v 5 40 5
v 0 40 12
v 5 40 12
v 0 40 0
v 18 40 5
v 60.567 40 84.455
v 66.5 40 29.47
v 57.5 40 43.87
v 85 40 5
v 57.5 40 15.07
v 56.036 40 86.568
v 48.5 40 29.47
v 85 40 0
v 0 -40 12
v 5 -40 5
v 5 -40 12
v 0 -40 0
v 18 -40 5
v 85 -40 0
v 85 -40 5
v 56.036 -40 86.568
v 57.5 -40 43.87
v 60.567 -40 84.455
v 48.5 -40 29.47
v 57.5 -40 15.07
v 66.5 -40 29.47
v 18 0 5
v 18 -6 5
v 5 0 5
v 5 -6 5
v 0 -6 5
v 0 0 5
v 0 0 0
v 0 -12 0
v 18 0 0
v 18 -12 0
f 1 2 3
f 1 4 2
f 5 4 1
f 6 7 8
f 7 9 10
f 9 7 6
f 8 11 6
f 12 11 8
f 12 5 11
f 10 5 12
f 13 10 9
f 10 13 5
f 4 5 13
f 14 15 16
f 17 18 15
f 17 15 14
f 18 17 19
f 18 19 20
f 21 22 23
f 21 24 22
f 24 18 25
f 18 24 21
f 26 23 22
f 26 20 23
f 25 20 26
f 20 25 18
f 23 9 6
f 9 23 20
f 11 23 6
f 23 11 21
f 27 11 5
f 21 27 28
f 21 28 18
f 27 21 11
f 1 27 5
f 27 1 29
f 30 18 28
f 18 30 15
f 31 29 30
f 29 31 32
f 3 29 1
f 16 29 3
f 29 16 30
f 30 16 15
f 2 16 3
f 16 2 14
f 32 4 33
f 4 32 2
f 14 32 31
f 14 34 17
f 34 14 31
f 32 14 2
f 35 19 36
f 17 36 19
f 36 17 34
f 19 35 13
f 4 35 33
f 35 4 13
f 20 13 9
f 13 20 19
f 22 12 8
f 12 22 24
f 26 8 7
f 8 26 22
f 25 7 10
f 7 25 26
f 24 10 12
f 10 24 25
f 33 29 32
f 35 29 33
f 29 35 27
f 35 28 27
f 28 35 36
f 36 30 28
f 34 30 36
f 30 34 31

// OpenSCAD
// Phone & Tablet Stand with cable channel - original parametric design (Brian Sacco)
// Solid wedge profile (no bridges, no flat overhangs) with a pointed weight-saving window:
// prints standing as oriented, without supports (verified with PrusaSlicer).
angle     = 65;    // viewing angle from horizontal (degrees)
width     = 80;    // stand width (mm)
device_t  = 13;    // slot width: phone + case thickness (mm)
lip_h     = 12;    // front lip height
back_h    = 90;    // backrest length
t         = 5;     // plate thickness
cable     = true;  // channel for the charging cable
depth     = 85;    // base depth
$fn = 48;

bx = t + device_t;                        // where the backrest starts (front face)
tx = bx + back_h * cos(angle);            // backrest top, front face
tz = t + back_h * sin(angle);
nx = t * sin(angle); nz = -t * cos(angle);   // backrest thickness, perpendicular to its face

module profile() {
    polygon([
        [0, 0], [depth, 0], [depth, t],       // base
        [tx + nx, tz + nz],                   // rear slope up to the back of the backrest top
        [tx, tz],                             // backrest top
        [bx, t],                              // backrest front face down to the slot
        [t, t], [t, lip_h], [0, lip_h]        // slot floor + front lip
    ]);
}
// pointed (diamond) window: all edges steeper than 55 degrees -> self-supporting
module window() {
    cx = (bx + depth) / 2 + 6; cz = t + (tz - t) * 0.30;
    hw = min(9, (depth - bx) * 0.18); hh = hw * 1.6;
    polygon([[cx, cz - hh], [cx + hw, cz], [cx, cz + hh], [cx - hw, cz]]);
}

rotate([90, 0, 0]) translate([0, 0, -width / 2]) difference() {
    linear_extrude(width) difference() { profile(); window(); }
    // cable channel under the slot, pointed roof (> 55 deg), ends before the backrest
    if (cable) translate([-1, 0, width / 2]) rotate([0, 90, 0]) linear_extrude(bx + 1)
        polygon([[0, -5], [-(t + 1), -5], [-(t + 7), 0], [-(t + 1), 5], [0, 5]]);
}
